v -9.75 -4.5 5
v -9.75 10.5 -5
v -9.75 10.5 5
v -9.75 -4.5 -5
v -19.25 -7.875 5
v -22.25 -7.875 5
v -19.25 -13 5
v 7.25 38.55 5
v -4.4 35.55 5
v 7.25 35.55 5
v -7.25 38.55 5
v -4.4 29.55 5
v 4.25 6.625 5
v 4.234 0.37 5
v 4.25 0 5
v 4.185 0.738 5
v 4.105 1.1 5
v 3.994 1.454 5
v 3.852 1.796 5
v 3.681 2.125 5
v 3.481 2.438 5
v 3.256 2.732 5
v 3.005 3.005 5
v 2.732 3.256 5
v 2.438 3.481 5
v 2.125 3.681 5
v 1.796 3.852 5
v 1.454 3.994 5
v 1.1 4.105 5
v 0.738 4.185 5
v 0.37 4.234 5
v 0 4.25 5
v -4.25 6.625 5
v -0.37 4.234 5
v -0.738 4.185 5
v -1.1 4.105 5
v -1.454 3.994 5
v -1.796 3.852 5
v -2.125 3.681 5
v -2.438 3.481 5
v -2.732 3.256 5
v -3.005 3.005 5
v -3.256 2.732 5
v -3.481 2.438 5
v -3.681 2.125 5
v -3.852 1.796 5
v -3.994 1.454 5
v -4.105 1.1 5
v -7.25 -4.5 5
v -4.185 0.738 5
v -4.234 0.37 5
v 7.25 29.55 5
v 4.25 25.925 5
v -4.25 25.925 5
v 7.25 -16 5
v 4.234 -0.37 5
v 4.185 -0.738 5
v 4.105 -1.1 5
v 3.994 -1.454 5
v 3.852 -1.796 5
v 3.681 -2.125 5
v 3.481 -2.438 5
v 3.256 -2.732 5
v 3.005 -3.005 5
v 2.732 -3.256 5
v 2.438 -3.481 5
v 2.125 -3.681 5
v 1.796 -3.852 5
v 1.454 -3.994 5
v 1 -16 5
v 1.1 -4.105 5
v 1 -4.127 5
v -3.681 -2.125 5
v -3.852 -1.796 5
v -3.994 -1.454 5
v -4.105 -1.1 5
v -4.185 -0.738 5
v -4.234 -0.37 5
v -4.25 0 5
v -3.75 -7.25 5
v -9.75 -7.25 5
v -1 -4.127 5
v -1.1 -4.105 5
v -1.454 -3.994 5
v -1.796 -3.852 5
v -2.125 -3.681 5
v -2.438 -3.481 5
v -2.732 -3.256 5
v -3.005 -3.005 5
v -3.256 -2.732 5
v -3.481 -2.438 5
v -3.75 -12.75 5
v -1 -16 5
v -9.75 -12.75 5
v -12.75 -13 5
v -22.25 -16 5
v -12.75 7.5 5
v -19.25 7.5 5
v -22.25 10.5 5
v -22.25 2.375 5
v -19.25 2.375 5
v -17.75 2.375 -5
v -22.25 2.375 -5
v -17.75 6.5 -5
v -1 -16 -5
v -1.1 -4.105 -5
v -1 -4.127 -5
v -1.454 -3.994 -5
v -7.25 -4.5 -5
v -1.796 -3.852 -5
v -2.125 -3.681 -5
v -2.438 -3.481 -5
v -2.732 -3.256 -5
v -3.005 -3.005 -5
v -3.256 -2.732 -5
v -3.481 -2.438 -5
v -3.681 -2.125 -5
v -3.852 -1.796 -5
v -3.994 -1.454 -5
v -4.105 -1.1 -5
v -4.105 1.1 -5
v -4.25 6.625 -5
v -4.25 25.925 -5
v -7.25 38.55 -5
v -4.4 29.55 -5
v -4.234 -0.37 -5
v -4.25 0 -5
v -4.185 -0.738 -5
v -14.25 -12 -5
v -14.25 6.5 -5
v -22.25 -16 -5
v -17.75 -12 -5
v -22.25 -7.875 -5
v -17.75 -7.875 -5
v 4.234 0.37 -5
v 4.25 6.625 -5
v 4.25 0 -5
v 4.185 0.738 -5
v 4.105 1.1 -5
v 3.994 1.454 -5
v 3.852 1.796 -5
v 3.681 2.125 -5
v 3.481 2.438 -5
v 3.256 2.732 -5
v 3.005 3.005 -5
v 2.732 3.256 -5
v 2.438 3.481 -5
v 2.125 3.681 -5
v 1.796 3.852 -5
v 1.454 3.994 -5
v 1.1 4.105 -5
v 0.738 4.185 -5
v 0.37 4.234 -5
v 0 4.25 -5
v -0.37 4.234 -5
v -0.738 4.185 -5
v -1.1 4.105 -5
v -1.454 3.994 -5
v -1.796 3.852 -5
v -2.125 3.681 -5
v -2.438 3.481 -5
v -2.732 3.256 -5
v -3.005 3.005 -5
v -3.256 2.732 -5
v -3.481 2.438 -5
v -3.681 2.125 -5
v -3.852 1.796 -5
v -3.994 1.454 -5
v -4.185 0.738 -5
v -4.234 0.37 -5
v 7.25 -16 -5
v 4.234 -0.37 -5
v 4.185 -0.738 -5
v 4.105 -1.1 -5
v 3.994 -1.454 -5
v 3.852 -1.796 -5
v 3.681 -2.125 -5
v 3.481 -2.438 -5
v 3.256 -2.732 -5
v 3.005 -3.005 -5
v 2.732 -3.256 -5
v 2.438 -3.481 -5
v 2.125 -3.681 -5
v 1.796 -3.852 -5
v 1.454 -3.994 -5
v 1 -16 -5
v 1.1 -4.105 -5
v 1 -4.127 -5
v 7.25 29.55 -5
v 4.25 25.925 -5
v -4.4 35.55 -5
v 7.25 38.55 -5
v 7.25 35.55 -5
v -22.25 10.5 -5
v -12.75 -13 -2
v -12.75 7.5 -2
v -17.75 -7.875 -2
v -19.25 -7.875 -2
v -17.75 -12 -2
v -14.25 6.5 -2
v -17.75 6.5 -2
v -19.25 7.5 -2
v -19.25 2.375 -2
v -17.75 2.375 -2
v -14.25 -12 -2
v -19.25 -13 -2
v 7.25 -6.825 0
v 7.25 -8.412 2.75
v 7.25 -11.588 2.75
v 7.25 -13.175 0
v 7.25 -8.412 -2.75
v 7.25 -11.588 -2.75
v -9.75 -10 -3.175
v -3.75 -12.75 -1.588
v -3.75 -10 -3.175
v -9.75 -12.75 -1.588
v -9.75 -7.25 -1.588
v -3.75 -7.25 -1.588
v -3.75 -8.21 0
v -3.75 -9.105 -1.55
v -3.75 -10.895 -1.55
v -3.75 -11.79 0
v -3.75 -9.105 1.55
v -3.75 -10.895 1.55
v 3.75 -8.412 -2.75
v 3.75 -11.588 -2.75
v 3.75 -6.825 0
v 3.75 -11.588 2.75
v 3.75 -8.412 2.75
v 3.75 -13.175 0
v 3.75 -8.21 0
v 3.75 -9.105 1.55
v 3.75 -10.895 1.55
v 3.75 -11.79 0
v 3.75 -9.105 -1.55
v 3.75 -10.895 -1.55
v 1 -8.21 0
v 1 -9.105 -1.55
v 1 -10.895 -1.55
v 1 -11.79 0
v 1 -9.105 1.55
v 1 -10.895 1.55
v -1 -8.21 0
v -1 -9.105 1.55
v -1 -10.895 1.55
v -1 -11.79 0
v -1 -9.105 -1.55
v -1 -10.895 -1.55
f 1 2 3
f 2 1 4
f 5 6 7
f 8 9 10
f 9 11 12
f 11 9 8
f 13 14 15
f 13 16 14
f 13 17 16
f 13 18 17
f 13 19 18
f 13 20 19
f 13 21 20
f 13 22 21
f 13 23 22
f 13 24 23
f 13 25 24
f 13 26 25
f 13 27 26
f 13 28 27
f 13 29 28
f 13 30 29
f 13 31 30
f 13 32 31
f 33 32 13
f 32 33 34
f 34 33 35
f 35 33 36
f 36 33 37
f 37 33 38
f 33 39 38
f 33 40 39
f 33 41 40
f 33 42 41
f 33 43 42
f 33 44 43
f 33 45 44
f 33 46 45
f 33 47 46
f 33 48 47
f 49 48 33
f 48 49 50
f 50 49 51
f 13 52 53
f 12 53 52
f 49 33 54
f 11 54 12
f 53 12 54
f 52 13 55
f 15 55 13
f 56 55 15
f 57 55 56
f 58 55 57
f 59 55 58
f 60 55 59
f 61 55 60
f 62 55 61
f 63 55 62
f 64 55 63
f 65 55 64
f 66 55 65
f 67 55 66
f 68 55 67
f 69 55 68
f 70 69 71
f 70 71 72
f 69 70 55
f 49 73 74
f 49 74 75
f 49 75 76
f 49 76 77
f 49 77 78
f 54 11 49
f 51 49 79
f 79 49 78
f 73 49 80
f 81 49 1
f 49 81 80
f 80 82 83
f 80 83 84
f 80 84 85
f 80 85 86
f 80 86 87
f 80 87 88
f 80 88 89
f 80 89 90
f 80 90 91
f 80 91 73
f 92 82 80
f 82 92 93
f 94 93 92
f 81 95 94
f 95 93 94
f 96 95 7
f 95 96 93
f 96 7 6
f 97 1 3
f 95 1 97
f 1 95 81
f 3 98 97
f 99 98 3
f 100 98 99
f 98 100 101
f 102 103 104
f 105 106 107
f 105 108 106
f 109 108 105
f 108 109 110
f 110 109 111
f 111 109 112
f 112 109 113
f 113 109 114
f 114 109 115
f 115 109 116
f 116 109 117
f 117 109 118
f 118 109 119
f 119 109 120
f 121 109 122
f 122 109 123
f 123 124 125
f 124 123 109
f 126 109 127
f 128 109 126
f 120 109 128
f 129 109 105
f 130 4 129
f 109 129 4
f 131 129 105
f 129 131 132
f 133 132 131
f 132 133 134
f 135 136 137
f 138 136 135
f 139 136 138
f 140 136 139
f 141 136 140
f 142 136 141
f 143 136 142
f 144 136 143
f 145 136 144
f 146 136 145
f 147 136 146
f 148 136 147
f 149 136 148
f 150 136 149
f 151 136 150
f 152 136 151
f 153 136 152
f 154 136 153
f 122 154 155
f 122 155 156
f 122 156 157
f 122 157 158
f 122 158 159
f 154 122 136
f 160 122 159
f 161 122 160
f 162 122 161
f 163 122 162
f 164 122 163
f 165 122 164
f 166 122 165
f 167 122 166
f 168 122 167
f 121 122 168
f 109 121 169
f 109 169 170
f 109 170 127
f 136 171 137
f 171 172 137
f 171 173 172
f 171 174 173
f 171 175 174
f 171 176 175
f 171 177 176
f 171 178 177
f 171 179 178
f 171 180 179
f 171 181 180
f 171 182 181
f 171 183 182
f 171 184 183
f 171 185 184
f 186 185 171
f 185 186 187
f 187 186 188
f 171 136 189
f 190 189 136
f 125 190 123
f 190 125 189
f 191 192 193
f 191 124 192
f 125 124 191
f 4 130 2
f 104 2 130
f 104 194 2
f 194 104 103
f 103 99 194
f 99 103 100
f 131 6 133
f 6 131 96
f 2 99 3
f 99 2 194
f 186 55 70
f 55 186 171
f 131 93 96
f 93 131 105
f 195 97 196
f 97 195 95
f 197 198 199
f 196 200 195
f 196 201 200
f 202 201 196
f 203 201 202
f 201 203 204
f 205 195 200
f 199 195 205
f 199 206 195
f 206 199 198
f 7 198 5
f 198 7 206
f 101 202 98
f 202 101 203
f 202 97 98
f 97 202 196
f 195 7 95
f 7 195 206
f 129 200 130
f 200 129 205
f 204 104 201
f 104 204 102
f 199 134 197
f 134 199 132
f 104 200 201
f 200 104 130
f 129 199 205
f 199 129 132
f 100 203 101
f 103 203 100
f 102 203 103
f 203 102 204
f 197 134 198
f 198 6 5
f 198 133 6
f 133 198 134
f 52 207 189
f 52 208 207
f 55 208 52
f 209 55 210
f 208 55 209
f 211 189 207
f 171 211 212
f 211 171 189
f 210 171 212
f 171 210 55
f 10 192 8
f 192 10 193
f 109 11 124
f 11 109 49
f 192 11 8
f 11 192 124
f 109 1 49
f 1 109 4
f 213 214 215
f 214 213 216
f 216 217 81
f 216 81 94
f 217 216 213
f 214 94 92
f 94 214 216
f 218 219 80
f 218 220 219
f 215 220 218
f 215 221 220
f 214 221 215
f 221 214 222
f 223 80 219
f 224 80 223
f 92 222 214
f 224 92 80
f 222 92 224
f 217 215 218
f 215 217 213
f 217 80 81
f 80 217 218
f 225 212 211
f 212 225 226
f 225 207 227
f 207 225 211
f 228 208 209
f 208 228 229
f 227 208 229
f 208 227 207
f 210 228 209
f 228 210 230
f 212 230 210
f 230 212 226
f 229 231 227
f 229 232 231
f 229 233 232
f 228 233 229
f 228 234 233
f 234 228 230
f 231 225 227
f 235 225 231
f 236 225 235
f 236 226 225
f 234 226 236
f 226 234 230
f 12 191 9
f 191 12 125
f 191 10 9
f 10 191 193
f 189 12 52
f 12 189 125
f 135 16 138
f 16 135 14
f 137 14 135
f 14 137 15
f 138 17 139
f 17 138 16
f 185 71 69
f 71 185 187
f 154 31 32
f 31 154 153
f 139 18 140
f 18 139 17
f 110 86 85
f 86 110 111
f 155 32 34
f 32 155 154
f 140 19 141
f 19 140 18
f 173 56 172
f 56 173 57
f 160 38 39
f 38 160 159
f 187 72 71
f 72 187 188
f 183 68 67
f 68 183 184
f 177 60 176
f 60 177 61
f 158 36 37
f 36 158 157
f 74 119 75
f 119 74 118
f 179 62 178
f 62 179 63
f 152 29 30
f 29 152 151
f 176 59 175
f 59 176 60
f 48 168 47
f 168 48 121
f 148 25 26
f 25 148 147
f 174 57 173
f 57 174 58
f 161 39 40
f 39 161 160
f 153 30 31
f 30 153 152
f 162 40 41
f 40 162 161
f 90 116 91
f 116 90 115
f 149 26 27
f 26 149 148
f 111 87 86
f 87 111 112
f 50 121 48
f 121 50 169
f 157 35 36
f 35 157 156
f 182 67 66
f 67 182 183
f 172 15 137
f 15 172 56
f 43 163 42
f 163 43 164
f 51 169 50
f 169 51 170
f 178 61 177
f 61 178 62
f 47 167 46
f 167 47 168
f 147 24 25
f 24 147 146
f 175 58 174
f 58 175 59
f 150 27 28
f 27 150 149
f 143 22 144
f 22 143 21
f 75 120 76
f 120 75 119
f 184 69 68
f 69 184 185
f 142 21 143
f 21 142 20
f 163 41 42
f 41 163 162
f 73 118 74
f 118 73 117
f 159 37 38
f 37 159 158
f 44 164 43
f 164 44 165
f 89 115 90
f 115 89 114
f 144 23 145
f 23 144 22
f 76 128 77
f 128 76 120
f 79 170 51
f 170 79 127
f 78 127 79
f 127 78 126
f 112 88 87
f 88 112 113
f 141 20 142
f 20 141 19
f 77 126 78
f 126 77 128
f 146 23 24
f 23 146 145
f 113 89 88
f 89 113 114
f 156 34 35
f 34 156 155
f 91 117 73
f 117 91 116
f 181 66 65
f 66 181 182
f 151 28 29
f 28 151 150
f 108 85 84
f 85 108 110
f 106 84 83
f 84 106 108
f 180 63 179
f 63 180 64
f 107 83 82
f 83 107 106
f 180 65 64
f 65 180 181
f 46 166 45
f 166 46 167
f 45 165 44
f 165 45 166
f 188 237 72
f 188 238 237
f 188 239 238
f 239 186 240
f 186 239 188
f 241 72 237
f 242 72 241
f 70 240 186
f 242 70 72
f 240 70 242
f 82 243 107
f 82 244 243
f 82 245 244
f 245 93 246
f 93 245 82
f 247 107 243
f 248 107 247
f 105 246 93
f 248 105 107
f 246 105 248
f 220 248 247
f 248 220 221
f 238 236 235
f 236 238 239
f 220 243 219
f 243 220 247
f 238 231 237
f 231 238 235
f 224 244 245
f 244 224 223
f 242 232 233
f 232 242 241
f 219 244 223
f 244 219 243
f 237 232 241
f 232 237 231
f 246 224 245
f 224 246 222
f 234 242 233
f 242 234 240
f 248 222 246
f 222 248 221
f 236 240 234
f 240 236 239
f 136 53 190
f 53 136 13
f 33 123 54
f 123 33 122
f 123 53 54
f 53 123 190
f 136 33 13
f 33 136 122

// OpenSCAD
//
// Original version
//

da6 = 1 / cos(180 / 6) / 2;

clearance       = 0.5;
frame_thickness = 6;
rod_diam        = 8 + clearance;
rod_frame_gap   = 25.3;
rod_frame_center_to_center = rod_frame_gap + frame_thickness/2 + rod_diam/2;
rod_endstop_center_to_center = 16;

endstop_width  = 6 + clearance;
endstop_length = 20 + clearance;
endstop_height = 8;

thickness = 3;
height    = 10;

module z_endstop_holder() {
  difference() {
    z_frame();
    z_holes();
  }

  % cylinder(r=rod_diam/2,h=height*2,center=true);

}

module z_frame() {
  // main body
  translate([-1*(rod_diam/2+thickness),-rod_diam/2-thickness,-height/2])
    cube([rod_diam+thickness*2,rod_diam+frame_thickness+rod_frame_gap+thickness*2,height]);

  // clamp area
  translate([0,-8,0])
    cube([rod_diam+thickness*2,16,height],center=true);

  // joint between clamp and endstop
  translate([0,-8,0])
    translate([-8,-0.25*(6+thickness),0]) cube([6.1+thickness,5.5+thickness*2,height],center=true);

  // endstop mount
  translate([-rod_endstop_center_to_center,-2.75,0]) endstop_support();
}

module z_holes() {
  // frame slot
  translate([thickness/2,rod_frame_center_to_center,0])
    cube([rod_diam+thickness*1.1,frame_thickness,height*2],center=true);

  // smooth rod slot
  cylinder(r=rod_diam/2,h=height*2,$fn=72,center=true);
  translate([0,-1*(rod_diam),0]) cube([2,rod_diam*2+thickness,height*2],center=true);

  // clamp screw
  translate([0,-10,0]) rotate([90,0,0]) rotate([0,90,0]) cylinder(r=3.1*da6,h=rod_diam+thickness*3,$fn=6,center=true);

  translate([0,-rod_diam-thickness/2,0]) {
    // captive clamp nut
    translate([-rod_diam/2-thickness+.5,0,0]) {
      rotate([0,90,0]) cylinder(r=5.5*da6,h=6,$fn=6,center=true);
      translate([0,0,height/2]) cube([6,5.5,height],center=true);
    }

    // clamp screw recess
    translate([rod_diam/2+thickness/1.5,0,0]) rotate([90,0,0]) rotate([0,90,0]) cylinder(r=5.5*da6,h=5,$fn=6,center=true);
  }

  // empty space between rod and frame
  translate([0,rod_frame_center_to_center/2,0])
    cube([rod_diam,rod_frame_gap-thickness*2,height*2],center=true);
}
% translate([-1,-10,0]) rotate([90,0,0]) rotate([0,90,0]) cylinder(r=3/2,h=10,$fn=32,center=true);

module endstop_support() {
  difference() {
    cube([endstop_width+thickness*2,endstop_length+thickness*2,height],center=true);

    // crevice
    translate([0,0,height-endstop_height]) cube([endstop_width,endstop_length,height-2],center=true);

    // bottom hole
    translate([0,0,-thickness]) cube([endstop_width-thickness,endstop_length-2,height*2],center=true);

    // side opening, to allow wires through
    translate([-1*(endstop_width),0,0]) cube([endstop_width*2,endstop_length/2,height*2],center=true);
  }
}

z_endstop_holder();
